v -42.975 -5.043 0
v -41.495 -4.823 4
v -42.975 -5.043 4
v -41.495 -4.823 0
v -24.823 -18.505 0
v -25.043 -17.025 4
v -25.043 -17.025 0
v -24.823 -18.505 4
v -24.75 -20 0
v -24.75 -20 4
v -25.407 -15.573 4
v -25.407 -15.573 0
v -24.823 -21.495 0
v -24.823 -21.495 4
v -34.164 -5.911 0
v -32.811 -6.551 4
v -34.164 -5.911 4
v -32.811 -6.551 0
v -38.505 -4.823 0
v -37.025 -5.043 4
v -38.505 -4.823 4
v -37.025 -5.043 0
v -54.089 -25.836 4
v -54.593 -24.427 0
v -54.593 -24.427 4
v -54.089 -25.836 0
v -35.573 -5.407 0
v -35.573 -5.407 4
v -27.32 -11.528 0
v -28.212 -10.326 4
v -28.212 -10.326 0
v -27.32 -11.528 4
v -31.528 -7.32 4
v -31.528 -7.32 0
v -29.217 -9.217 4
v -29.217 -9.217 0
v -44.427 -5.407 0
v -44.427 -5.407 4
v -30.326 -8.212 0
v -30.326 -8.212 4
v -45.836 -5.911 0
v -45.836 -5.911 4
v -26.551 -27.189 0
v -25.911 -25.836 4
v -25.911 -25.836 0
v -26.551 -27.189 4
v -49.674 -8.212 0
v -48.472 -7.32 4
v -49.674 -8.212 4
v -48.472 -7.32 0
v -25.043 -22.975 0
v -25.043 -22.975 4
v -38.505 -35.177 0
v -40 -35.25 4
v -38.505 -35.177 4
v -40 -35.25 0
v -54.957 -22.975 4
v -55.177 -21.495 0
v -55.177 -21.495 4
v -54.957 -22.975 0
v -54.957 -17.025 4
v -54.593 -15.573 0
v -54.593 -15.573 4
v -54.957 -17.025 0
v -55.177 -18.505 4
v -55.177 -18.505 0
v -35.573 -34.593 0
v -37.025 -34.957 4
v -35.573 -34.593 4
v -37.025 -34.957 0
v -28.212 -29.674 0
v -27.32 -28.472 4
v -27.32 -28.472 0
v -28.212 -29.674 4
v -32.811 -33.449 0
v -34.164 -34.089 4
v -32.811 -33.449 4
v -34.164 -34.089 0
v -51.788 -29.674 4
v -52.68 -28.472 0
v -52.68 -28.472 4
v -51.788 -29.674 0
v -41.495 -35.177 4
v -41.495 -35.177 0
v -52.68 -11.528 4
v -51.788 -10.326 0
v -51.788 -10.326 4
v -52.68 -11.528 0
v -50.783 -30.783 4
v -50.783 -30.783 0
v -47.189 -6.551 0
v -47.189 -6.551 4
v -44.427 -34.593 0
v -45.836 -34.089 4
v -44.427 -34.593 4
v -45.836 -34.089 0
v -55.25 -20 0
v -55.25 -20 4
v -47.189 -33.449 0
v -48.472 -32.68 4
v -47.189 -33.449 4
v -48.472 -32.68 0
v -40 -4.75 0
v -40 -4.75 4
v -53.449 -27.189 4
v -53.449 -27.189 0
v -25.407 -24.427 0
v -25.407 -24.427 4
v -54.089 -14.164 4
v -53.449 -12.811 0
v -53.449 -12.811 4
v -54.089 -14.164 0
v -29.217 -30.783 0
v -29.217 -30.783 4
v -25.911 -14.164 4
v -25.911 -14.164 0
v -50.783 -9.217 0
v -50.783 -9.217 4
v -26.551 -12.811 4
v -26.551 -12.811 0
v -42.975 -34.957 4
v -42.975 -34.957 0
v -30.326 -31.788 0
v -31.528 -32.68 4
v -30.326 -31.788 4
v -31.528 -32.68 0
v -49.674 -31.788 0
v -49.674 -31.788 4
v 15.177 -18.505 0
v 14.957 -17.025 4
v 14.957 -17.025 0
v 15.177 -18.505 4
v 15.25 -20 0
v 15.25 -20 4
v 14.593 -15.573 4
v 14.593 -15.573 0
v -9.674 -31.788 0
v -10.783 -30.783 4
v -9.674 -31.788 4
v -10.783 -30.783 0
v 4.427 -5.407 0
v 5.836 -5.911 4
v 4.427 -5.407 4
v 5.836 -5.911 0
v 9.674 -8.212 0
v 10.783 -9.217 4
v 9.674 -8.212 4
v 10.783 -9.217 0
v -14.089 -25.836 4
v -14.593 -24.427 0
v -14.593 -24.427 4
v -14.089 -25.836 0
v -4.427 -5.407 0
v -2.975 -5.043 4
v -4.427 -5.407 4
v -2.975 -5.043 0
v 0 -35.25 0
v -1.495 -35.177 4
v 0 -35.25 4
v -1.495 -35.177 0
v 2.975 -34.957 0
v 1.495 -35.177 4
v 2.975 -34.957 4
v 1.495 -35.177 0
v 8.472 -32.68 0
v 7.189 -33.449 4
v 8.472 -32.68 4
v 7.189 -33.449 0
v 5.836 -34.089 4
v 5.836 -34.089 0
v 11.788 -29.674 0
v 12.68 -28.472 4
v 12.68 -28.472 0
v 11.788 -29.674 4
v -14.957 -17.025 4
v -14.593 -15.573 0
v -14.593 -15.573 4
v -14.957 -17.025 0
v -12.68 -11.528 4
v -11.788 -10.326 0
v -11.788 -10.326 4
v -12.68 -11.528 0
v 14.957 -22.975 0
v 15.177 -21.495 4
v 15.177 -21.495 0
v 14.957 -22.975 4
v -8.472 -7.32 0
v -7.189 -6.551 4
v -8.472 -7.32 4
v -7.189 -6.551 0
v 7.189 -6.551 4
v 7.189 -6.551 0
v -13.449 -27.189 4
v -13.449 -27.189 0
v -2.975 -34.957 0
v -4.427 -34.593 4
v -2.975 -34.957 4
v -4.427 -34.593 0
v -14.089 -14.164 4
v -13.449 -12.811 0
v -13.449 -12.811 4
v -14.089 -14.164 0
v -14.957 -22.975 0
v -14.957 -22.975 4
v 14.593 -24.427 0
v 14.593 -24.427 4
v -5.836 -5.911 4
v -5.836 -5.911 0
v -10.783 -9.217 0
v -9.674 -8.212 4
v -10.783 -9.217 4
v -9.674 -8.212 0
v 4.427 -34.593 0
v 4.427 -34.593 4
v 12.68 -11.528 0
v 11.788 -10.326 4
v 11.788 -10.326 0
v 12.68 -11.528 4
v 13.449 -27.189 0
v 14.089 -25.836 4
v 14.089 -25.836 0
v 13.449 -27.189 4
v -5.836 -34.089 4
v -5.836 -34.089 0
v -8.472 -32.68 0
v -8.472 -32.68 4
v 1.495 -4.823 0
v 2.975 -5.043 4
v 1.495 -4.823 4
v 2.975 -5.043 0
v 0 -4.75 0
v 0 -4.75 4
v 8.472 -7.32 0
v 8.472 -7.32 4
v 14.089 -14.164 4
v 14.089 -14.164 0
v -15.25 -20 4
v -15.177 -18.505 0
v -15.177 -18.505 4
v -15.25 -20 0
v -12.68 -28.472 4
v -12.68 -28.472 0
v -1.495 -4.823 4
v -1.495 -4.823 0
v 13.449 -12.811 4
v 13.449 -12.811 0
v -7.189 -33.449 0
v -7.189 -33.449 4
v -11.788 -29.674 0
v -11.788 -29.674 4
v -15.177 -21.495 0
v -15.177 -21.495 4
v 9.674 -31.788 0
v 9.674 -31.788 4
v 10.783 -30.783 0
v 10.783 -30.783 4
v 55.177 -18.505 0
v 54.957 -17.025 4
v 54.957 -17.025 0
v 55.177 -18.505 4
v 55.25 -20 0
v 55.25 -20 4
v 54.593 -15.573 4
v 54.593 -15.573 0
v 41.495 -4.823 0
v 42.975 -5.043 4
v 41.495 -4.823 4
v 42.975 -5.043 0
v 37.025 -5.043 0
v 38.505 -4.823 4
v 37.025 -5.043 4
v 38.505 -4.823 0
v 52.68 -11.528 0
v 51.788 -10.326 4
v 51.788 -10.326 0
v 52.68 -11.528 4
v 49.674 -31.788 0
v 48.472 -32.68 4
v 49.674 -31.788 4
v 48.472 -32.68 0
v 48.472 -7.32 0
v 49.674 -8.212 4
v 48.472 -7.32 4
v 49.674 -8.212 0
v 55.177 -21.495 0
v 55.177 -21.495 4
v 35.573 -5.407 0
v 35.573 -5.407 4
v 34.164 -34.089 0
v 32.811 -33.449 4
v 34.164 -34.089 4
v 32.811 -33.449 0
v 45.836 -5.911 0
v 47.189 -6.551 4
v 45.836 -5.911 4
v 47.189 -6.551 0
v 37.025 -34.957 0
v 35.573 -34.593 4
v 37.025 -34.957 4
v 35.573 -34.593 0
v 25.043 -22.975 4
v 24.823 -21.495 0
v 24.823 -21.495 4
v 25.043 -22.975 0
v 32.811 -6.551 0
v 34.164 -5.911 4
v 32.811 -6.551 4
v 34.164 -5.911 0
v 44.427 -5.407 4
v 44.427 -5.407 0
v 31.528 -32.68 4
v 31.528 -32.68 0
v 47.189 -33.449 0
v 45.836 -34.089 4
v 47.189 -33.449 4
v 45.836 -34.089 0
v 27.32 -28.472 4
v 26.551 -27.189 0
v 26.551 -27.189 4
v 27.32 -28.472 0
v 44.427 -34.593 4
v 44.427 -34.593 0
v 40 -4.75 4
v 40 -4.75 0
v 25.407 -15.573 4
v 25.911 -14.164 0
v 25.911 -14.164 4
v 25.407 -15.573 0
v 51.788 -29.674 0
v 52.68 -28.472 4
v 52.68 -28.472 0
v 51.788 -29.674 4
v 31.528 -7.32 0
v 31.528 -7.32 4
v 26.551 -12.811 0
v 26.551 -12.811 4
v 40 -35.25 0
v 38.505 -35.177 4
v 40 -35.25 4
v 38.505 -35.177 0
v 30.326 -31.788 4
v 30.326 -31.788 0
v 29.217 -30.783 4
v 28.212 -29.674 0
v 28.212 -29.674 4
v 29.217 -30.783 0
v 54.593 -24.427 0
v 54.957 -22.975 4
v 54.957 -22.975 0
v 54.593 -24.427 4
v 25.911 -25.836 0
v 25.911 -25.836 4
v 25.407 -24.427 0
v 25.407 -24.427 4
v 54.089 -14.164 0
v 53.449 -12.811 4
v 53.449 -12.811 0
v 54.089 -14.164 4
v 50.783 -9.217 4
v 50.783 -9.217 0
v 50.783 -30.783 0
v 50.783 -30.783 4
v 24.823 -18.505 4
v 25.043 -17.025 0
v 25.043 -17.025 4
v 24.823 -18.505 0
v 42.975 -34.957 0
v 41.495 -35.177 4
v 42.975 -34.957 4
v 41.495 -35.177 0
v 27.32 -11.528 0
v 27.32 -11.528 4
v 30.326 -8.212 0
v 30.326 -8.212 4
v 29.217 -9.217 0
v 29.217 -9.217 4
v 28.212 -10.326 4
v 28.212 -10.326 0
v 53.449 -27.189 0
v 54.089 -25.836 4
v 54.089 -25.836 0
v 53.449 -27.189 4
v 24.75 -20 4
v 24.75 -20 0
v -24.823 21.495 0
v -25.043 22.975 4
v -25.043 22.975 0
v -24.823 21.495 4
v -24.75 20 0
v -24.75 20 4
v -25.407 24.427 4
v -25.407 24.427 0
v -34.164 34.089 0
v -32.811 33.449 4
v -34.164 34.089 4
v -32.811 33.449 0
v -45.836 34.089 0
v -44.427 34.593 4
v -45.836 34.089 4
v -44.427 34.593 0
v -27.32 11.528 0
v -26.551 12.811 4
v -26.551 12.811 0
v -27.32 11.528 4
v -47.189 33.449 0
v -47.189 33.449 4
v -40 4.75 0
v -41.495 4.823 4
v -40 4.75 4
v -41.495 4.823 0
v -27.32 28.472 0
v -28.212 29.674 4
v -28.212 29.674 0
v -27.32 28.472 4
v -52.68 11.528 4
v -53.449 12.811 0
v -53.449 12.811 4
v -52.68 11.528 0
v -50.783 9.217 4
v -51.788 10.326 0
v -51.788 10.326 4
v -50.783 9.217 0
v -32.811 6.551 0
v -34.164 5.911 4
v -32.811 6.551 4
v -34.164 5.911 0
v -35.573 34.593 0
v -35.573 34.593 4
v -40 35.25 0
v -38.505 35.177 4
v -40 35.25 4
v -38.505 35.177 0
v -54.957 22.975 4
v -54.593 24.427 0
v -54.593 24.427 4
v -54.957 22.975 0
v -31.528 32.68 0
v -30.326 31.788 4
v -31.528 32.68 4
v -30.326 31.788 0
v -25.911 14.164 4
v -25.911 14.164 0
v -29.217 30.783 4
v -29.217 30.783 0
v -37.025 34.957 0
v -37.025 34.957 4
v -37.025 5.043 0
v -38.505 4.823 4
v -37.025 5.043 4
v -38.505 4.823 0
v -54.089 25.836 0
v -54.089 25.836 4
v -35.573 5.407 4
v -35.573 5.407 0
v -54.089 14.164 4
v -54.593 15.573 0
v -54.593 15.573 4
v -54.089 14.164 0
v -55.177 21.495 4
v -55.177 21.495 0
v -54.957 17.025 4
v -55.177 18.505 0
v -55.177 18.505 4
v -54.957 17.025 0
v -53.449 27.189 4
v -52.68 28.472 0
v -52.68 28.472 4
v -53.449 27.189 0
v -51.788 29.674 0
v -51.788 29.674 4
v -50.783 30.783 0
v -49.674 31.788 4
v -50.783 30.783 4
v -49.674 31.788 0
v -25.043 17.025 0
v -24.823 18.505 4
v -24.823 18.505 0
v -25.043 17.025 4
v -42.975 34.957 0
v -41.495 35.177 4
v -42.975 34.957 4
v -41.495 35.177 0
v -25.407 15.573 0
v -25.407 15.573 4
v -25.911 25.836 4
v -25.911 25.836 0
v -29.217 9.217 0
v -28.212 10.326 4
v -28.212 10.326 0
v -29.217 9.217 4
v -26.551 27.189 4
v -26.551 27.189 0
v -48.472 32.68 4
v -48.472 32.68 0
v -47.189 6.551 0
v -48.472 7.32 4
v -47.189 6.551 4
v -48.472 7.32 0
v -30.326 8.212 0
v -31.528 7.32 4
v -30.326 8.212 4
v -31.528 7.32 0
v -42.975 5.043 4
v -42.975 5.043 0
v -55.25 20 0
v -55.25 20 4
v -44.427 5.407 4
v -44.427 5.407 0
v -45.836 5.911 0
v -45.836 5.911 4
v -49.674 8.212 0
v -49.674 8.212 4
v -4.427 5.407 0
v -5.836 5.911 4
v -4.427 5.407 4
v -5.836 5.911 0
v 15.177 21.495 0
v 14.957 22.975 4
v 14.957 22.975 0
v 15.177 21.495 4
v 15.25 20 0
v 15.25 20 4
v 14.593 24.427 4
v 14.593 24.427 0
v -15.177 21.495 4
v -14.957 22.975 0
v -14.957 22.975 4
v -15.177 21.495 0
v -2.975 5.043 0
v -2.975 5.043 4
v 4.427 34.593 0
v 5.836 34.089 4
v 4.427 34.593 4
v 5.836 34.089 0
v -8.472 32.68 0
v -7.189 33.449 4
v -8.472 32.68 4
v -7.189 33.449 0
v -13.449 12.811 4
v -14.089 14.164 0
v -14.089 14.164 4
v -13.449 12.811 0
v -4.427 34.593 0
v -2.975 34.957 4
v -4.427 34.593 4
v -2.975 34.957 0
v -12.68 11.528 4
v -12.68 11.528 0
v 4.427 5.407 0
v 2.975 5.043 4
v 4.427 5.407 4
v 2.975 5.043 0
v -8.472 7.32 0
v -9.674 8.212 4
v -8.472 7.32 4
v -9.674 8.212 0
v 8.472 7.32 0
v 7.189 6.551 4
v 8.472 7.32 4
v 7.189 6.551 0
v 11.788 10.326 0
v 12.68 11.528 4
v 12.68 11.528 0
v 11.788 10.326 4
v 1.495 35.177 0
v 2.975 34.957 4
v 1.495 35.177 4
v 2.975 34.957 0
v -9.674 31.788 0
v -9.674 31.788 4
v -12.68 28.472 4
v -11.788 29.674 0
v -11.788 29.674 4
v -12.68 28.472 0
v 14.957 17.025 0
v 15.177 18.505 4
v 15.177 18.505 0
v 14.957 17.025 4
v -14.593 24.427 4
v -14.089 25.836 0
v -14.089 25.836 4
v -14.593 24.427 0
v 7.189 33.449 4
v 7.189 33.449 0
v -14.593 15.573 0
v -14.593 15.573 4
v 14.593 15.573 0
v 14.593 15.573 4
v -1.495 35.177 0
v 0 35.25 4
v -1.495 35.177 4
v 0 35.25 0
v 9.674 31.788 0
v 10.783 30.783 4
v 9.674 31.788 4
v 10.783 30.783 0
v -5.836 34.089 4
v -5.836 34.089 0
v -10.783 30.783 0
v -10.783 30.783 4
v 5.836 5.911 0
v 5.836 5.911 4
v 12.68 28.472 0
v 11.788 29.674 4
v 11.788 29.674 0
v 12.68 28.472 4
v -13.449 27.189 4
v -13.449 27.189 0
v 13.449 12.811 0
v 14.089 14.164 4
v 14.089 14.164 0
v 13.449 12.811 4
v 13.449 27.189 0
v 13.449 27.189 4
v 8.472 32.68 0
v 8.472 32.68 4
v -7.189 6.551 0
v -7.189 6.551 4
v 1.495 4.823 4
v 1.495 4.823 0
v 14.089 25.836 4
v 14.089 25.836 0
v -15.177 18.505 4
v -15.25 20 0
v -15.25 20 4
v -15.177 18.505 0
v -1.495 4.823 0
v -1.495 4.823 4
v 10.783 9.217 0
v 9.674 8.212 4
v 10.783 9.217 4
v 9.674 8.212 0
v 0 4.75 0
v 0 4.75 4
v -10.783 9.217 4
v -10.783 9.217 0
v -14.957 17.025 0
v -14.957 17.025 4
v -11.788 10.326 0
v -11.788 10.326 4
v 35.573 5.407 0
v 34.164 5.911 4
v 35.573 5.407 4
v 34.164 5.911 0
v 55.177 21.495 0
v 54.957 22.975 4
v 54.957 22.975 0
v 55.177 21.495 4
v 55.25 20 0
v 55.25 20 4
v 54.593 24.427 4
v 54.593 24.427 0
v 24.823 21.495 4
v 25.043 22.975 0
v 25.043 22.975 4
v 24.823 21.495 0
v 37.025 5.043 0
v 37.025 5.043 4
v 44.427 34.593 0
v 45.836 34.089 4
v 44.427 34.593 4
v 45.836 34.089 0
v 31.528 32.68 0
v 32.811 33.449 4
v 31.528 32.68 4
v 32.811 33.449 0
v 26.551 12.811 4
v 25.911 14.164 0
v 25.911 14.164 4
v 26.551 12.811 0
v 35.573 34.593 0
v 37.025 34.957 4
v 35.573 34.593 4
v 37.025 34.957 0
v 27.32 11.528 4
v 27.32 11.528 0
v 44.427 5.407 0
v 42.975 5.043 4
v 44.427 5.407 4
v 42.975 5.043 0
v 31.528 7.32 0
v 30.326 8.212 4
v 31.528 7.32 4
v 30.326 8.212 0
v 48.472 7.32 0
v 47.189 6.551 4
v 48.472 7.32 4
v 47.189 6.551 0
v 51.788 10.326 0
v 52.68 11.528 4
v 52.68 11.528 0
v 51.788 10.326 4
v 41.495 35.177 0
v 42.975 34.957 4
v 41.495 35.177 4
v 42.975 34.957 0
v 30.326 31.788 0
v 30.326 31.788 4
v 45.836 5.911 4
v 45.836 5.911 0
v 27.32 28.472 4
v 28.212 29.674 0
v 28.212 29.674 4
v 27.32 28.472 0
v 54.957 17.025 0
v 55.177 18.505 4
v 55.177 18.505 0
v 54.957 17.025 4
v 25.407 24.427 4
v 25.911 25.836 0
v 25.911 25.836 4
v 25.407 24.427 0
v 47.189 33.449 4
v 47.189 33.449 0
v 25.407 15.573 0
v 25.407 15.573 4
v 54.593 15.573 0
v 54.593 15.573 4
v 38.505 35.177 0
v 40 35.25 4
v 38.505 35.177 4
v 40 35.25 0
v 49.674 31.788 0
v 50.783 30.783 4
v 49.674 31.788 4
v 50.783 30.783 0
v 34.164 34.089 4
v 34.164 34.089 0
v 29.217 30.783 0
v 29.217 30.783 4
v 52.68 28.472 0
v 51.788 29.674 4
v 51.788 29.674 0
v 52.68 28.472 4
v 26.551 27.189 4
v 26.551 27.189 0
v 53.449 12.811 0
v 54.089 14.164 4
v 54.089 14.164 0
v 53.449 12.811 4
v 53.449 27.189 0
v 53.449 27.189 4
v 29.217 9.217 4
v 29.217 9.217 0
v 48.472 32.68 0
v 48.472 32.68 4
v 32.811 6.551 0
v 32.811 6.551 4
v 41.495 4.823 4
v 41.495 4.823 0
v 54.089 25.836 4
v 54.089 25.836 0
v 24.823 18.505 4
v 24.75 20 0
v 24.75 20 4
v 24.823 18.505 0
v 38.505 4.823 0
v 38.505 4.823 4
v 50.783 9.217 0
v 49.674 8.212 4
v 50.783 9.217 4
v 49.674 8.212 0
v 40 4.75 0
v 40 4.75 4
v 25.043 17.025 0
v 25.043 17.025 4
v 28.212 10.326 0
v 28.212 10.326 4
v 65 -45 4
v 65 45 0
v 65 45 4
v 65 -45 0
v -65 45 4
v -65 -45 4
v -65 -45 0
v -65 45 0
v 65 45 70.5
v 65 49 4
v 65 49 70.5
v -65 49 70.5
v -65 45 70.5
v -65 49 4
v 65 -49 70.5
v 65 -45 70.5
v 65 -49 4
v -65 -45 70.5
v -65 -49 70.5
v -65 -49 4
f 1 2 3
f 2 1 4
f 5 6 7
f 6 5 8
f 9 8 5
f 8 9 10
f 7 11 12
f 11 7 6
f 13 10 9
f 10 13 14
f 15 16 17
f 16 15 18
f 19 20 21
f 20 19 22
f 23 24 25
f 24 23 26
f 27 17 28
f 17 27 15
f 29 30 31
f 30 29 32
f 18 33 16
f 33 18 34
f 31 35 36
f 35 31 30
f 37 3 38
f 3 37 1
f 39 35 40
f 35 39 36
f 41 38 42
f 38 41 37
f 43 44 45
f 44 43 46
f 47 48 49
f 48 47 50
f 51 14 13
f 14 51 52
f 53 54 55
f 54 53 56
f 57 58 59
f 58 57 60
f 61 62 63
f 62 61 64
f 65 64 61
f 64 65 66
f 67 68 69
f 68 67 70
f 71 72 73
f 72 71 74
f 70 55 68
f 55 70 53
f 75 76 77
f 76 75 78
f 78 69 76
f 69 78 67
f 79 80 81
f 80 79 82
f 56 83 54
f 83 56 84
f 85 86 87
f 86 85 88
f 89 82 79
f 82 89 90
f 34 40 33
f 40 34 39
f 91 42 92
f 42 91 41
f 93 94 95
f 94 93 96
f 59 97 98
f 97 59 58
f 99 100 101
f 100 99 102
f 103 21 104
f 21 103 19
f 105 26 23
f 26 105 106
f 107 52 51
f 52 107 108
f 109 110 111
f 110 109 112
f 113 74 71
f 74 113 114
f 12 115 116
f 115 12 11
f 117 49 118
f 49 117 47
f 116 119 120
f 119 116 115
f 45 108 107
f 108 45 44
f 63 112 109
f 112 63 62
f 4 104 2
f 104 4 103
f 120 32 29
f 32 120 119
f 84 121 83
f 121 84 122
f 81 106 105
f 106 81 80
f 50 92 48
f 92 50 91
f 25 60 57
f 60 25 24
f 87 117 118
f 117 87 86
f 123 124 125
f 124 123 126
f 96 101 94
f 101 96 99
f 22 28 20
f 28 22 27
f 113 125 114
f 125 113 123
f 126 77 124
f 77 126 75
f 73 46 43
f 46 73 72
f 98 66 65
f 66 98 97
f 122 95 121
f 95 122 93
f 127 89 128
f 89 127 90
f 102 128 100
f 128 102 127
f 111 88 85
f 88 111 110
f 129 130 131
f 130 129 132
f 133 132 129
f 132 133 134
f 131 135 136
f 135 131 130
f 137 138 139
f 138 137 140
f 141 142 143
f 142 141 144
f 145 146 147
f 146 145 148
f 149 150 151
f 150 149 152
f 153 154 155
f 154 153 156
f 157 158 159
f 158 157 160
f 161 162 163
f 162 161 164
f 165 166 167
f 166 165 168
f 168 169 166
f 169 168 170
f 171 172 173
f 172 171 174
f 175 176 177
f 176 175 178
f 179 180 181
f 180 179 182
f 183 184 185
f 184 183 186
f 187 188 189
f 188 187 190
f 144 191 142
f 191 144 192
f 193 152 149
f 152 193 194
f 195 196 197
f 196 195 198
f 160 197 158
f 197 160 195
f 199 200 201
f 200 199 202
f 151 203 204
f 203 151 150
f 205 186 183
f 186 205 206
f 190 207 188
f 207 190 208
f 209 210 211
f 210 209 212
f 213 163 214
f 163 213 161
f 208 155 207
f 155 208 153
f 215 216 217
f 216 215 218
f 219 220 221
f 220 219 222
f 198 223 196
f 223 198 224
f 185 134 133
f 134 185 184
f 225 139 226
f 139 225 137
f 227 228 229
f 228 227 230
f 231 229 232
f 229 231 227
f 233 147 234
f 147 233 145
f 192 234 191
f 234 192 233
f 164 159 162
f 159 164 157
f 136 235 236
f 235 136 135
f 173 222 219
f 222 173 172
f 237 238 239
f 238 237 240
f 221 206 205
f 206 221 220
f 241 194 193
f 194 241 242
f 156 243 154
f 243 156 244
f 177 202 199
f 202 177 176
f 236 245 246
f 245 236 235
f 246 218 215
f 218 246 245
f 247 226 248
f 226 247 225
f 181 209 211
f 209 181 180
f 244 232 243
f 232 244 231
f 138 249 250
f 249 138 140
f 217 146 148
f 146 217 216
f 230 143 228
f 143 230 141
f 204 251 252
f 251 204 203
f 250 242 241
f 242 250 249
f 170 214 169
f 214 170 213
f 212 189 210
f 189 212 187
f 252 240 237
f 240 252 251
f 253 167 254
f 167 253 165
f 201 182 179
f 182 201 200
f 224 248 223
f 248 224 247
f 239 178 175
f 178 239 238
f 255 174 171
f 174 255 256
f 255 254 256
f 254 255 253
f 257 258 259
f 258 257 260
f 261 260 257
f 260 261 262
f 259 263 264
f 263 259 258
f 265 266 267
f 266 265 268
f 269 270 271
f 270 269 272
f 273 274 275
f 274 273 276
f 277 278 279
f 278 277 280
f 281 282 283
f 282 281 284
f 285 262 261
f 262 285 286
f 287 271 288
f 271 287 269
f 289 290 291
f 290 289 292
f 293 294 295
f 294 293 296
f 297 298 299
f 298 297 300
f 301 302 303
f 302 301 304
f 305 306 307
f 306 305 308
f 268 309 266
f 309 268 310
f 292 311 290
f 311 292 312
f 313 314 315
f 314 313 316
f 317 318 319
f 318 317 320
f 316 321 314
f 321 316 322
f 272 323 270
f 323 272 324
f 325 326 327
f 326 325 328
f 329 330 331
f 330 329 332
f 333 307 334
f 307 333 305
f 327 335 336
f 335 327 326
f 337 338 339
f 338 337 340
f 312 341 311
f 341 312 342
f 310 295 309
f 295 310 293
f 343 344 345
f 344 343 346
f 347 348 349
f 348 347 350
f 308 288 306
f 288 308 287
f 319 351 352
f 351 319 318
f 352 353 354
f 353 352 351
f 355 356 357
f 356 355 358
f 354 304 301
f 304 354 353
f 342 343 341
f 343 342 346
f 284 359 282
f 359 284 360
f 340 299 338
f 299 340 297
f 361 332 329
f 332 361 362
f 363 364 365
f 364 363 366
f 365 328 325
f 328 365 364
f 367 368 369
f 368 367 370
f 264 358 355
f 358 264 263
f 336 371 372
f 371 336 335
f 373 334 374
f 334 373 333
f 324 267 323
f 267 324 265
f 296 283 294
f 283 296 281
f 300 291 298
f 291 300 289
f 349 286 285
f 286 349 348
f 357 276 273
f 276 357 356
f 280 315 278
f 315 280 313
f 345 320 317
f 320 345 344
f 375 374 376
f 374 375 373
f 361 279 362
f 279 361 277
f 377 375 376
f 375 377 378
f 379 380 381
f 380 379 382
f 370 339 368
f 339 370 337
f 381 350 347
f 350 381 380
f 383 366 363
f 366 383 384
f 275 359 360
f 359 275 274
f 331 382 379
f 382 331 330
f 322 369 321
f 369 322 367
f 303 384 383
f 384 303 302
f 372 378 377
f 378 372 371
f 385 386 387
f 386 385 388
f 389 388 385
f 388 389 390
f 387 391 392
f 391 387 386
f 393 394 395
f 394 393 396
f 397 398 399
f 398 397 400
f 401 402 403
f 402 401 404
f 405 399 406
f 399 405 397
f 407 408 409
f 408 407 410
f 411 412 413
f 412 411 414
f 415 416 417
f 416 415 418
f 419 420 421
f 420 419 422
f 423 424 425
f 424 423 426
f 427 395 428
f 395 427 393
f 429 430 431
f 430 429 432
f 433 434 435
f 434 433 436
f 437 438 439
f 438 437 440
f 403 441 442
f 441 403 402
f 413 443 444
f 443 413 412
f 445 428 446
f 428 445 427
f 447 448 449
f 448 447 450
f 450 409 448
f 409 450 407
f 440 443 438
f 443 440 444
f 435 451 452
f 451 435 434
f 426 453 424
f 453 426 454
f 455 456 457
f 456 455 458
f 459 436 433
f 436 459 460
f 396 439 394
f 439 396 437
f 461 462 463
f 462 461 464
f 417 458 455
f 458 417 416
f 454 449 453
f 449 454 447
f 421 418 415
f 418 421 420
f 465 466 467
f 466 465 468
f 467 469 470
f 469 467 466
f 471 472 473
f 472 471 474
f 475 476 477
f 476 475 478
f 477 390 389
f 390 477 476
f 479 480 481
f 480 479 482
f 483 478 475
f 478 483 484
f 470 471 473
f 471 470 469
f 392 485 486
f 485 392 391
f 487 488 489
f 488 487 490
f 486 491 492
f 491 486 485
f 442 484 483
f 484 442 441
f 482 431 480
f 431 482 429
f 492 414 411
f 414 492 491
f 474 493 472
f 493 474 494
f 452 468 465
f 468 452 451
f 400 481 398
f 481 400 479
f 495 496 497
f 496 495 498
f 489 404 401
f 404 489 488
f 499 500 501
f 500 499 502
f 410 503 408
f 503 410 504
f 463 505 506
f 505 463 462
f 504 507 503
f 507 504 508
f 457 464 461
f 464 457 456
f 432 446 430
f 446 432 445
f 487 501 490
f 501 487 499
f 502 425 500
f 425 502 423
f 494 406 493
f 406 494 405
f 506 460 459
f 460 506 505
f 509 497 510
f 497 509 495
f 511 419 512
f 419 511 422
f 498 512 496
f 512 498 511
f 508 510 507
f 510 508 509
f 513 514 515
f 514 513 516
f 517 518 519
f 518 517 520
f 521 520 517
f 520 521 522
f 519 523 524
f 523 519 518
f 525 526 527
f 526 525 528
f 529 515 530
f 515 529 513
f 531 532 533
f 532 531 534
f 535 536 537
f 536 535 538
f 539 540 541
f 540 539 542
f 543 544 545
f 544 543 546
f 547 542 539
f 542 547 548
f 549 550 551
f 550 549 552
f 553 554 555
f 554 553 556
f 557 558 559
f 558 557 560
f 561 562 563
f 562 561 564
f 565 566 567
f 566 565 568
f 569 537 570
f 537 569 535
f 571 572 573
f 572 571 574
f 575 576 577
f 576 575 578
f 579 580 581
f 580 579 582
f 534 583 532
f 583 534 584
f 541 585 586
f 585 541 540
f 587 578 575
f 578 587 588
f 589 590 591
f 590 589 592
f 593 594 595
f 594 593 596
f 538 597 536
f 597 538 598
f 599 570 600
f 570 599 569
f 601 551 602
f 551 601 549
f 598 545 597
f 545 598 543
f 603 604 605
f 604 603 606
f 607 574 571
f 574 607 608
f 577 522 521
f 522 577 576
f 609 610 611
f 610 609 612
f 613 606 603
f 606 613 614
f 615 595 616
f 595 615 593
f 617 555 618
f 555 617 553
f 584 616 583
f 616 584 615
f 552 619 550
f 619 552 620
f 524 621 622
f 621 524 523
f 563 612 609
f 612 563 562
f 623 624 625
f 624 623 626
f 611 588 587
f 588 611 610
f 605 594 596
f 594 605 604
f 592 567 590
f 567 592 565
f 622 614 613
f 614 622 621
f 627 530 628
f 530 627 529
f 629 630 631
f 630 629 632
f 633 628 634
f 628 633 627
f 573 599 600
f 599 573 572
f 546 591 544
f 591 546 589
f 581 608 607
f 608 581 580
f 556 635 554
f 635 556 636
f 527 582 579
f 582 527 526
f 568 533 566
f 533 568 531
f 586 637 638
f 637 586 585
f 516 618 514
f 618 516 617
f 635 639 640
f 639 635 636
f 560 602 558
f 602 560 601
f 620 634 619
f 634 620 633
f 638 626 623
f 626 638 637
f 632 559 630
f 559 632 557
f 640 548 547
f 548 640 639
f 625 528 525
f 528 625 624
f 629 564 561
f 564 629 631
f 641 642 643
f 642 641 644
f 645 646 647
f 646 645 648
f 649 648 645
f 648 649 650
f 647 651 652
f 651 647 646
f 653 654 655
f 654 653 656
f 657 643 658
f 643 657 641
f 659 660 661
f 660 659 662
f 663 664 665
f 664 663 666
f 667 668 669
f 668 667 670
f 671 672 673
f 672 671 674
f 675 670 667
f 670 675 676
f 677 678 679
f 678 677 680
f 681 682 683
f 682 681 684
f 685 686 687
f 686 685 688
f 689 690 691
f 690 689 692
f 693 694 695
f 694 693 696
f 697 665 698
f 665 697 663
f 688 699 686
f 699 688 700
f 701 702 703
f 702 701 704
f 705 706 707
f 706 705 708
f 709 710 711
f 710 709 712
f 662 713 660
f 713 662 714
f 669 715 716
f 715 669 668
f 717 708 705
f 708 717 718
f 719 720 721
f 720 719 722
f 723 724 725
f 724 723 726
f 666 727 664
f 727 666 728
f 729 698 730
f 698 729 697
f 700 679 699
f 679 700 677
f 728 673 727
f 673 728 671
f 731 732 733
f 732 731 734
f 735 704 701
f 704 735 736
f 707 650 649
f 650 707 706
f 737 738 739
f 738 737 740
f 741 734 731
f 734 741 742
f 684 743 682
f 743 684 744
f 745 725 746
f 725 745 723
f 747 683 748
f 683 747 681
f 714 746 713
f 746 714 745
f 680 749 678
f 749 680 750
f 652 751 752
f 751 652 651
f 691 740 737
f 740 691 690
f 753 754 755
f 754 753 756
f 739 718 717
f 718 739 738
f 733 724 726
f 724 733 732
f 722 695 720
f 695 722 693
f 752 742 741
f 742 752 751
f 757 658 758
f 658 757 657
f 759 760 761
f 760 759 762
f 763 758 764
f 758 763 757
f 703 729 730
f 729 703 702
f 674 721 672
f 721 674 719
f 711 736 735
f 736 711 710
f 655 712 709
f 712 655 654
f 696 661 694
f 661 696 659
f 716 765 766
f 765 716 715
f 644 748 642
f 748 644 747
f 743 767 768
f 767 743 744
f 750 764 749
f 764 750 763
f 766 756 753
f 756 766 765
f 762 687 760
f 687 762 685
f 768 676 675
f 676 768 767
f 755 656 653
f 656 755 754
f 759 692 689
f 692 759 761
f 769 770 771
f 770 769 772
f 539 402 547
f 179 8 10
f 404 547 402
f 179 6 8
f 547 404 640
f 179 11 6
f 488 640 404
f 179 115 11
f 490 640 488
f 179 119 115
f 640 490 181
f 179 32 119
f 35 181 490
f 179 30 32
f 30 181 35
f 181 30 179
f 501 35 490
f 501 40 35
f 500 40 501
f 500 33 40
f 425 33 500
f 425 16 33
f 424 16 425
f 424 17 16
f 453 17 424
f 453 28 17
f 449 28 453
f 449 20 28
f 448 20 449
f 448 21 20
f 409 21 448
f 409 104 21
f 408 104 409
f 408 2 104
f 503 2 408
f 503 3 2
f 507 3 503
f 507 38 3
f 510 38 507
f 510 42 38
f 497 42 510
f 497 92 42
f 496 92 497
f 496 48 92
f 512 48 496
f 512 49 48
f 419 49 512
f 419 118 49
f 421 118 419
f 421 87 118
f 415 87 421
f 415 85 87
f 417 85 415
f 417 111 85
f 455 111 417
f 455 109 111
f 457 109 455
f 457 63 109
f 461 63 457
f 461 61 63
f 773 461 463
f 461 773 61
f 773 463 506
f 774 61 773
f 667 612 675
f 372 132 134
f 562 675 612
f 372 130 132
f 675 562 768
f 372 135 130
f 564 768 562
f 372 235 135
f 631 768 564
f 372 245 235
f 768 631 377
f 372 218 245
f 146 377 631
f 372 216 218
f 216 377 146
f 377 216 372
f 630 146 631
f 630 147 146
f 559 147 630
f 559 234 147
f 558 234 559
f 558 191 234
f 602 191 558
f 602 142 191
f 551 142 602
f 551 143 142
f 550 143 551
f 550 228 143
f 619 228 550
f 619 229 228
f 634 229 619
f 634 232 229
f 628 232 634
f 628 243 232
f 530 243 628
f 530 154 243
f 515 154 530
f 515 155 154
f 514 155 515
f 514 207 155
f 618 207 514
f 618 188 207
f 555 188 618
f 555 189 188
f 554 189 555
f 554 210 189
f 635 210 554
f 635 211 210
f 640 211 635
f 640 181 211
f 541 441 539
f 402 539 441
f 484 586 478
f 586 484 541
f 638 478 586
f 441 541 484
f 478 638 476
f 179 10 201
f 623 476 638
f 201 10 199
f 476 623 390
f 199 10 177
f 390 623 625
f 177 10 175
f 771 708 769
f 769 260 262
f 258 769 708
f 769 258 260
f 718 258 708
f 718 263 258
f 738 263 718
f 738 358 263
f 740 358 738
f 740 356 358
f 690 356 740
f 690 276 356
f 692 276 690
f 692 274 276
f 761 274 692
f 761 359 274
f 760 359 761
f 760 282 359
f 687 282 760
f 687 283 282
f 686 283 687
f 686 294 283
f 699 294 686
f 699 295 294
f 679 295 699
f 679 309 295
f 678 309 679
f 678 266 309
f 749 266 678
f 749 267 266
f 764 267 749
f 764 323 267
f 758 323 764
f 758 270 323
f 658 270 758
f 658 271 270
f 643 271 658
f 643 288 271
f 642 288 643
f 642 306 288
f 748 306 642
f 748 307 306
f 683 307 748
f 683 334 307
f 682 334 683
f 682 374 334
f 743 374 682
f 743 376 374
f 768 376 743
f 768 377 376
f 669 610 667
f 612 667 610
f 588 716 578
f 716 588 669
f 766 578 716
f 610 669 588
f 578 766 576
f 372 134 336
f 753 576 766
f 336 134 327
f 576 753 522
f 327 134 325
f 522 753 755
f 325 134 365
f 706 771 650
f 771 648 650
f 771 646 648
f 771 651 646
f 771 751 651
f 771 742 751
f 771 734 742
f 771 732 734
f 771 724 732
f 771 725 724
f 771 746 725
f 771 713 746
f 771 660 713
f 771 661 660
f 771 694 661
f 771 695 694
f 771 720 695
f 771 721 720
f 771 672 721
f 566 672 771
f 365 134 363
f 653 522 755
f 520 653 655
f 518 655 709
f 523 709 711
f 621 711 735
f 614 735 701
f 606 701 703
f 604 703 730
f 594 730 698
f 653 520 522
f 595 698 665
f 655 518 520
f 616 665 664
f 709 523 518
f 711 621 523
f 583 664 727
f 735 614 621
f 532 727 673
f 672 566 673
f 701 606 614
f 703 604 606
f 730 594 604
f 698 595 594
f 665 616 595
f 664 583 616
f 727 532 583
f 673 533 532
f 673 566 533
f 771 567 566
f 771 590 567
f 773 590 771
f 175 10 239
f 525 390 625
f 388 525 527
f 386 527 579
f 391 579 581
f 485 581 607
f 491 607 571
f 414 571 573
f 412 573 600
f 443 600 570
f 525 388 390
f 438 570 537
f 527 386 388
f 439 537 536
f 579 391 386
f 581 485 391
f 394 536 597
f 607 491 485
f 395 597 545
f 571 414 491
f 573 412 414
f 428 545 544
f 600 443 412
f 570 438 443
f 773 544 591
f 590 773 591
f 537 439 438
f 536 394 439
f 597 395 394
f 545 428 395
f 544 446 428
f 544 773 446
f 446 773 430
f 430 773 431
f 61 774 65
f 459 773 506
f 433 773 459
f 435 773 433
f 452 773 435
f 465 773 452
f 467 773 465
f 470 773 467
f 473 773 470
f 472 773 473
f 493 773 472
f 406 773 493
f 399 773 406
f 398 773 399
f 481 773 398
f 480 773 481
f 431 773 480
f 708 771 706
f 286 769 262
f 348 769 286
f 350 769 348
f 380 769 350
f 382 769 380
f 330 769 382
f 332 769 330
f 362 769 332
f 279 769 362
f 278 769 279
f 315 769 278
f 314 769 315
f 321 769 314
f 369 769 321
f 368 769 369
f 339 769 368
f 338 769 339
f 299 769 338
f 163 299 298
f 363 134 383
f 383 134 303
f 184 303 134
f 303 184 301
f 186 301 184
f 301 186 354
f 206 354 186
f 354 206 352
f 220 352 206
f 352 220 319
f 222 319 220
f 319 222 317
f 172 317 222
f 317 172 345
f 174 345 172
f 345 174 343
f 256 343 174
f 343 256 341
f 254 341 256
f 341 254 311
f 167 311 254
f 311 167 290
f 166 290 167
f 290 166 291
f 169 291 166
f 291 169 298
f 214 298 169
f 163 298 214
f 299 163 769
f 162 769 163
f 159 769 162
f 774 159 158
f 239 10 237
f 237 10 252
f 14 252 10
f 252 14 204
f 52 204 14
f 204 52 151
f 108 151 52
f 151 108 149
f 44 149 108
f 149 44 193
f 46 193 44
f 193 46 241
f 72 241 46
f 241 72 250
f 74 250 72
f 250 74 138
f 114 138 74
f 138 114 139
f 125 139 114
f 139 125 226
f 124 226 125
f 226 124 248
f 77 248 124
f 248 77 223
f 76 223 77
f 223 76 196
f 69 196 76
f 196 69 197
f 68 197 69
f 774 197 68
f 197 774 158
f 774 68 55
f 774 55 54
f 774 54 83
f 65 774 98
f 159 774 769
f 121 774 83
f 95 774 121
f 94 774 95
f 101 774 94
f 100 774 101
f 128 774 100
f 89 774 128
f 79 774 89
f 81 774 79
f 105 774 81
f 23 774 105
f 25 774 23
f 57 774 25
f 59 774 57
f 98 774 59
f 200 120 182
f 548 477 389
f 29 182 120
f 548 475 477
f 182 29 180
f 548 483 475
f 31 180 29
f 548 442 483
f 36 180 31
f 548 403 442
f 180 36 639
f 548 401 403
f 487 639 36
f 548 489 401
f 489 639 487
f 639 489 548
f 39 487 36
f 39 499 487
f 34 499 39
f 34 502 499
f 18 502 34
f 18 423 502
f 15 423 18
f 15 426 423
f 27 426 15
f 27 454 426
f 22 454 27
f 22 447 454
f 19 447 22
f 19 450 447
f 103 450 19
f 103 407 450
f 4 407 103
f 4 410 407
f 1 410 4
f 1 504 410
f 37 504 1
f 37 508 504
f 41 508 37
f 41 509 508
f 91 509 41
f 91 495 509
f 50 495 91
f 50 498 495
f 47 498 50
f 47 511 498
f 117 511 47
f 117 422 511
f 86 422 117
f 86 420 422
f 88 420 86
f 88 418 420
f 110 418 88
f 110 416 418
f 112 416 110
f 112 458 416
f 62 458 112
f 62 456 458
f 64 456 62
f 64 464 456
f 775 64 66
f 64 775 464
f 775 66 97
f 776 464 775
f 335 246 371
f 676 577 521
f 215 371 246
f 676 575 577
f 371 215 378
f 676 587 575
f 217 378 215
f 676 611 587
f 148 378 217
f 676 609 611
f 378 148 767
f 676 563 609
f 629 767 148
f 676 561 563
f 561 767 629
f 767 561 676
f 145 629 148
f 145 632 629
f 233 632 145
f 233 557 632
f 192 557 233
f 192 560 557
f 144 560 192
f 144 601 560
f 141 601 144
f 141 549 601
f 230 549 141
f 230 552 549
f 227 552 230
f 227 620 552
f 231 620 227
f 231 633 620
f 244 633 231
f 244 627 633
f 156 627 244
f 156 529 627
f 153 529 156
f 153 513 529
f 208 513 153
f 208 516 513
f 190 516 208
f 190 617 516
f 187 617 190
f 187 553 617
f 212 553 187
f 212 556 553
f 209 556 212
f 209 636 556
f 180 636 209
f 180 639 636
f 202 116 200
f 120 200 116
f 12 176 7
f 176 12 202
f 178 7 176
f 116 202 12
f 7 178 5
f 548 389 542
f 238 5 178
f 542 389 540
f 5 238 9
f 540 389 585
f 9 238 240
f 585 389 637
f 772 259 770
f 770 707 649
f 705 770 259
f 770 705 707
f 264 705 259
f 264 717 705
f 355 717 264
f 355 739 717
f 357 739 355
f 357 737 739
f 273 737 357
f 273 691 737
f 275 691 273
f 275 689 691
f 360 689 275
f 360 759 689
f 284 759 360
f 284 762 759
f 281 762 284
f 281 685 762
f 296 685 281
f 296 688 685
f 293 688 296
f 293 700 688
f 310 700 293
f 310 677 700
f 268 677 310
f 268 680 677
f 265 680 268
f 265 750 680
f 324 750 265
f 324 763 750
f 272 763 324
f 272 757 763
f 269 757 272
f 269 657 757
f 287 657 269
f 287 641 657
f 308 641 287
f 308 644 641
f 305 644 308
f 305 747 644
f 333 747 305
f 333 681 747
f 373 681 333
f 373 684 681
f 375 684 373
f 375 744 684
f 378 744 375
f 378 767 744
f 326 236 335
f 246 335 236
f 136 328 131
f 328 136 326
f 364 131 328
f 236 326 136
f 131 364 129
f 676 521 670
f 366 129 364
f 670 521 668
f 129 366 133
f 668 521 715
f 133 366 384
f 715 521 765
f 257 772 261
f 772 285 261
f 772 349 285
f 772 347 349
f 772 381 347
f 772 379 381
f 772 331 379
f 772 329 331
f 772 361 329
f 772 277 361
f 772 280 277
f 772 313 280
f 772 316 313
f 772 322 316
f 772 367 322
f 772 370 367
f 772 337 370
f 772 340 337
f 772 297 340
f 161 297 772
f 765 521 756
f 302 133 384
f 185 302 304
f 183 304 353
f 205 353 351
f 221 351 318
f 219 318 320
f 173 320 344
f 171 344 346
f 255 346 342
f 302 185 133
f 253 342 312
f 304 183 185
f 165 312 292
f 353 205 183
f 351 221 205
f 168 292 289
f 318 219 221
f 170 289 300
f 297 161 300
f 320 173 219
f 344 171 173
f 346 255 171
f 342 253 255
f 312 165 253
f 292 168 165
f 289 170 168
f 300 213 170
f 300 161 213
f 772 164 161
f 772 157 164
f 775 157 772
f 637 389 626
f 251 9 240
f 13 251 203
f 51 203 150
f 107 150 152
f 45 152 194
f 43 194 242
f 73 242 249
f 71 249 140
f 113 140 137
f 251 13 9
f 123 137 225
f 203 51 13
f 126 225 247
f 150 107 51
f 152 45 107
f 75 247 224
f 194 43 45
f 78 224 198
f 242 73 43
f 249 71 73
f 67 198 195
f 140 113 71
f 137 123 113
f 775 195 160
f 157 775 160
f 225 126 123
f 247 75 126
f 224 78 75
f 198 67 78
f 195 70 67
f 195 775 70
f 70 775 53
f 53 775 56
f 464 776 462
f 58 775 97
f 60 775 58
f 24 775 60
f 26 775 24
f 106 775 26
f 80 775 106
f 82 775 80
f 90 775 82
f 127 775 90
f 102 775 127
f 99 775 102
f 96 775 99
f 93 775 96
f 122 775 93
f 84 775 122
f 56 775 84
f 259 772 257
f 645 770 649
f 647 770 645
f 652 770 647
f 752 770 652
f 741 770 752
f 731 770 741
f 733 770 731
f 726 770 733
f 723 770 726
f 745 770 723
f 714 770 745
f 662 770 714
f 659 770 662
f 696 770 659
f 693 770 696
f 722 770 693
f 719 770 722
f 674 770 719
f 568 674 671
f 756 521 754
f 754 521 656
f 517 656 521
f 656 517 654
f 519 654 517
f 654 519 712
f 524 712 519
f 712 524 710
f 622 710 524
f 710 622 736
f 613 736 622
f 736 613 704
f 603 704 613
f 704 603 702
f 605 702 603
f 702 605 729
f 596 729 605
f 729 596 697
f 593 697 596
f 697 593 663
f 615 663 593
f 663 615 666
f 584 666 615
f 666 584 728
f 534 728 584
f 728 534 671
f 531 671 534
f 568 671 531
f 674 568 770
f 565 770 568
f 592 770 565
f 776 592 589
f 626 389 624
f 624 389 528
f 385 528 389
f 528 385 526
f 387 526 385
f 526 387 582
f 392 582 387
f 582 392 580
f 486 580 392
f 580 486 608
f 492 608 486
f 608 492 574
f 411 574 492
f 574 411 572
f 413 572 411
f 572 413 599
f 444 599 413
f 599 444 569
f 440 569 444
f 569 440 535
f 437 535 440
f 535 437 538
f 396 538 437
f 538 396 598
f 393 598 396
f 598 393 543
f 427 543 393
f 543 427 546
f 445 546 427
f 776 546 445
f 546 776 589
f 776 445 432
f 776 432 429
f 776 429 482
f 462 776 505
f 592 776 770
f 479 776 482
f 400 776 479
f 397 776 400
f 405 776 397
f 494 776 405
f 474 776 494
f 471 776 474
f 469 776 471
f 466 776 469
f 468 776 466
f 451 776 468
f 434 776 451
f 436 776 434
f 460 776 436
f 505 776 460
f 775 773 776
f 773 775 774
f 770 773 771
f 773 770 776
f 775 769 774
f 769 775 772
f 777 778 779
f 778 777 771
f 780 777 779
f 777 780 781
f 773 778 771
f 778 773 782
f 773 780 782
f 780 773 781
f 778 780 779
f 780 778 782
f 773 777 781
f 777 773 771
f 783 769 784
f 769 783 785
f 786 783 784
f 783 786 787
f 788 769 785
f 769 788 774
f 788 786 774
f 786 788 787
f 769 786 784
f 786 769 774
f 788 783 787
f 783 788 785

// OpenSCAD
// ---------- Parameters ----------
plate_x = 130;          // plate length (X) in mm
plate_y = 90;           // plate width  (Y) in mm
plate_z = 4;            // plate thickness (Z) in mm

hole_d = 30.5;          // tube hole diameter in mm
hole_spacing = 40;      // centre‑to‑centre spacing of holes in mm

wall_thick = 4;         // wall thickness (Y) in mm
wall_top_z = 70;        // final Z height of the wall after printing (mm)
wall_len = plate_x;    // wall length (X) = plate length

// Derived dimensions
wall_height = wall_top_z - plate_z;   // wall height above plate (mm)
wall_center_offset = plate_y/2 + wall_thick/2; // Y offset of wall centre (mm)

// ---------- Modules ----------
module base_plate() {
    // Plate centered on origin, lying on Z=0
    translate([-plate_x/2, -plate_y/2, 0])
        cube([plate_x, plate_y, plate_z]);
}

module hole_grid() {
    // 2 rows (Y) × 3 columns (X) of cylindrical holes
    // Row positions: -hole_spacing/2 , +hole_spacing/2
    // Column positions: -hole_spacing , 0 , +hole_spacing
    for (row = [-1, 1]) {
        for (col = [-1, 0, 1]) {
            translate([col*hole_spacing,
                       row*hole_spacing/2,
                       -0.5])   // extend below plate by 0.5 mm
                cylinder(d = hole_d,
                         h = plate_z + 1,   // extend above plate by 0.5 mm
                         $fn = 64);
        }
    }
}

module side_walls() {
    // Two walls along the long edges of the plate
    // Each wall: 130 mm × 4 mm × wall_height, positioned flush with plate edge
    // Wall on +Y side
    translate([-wall_len/2,
               plate_y/2,          // inner face at +Y edge of plate
               plate_z])          // start from plate top
        cube([wall_len, wall_thick, wall_height + 0.5]); // extend upward a bit

    // Wall on –Y side
    translate([-wall_len/2,
               -plate_y/2 - wall_thick, // inner face at –Y edge of plate
               plate_z])
        cube([wall_len, wall_thick, wall_height + 0.5]); // extend upward a bit
}

// ---------- Assembly ----------
union() {
    // Plate with through‑holes
    difference() {
        base_plate();
        hole_grid();
    }
    // Side walls (do not intersect holes)
    side_walls();
}
